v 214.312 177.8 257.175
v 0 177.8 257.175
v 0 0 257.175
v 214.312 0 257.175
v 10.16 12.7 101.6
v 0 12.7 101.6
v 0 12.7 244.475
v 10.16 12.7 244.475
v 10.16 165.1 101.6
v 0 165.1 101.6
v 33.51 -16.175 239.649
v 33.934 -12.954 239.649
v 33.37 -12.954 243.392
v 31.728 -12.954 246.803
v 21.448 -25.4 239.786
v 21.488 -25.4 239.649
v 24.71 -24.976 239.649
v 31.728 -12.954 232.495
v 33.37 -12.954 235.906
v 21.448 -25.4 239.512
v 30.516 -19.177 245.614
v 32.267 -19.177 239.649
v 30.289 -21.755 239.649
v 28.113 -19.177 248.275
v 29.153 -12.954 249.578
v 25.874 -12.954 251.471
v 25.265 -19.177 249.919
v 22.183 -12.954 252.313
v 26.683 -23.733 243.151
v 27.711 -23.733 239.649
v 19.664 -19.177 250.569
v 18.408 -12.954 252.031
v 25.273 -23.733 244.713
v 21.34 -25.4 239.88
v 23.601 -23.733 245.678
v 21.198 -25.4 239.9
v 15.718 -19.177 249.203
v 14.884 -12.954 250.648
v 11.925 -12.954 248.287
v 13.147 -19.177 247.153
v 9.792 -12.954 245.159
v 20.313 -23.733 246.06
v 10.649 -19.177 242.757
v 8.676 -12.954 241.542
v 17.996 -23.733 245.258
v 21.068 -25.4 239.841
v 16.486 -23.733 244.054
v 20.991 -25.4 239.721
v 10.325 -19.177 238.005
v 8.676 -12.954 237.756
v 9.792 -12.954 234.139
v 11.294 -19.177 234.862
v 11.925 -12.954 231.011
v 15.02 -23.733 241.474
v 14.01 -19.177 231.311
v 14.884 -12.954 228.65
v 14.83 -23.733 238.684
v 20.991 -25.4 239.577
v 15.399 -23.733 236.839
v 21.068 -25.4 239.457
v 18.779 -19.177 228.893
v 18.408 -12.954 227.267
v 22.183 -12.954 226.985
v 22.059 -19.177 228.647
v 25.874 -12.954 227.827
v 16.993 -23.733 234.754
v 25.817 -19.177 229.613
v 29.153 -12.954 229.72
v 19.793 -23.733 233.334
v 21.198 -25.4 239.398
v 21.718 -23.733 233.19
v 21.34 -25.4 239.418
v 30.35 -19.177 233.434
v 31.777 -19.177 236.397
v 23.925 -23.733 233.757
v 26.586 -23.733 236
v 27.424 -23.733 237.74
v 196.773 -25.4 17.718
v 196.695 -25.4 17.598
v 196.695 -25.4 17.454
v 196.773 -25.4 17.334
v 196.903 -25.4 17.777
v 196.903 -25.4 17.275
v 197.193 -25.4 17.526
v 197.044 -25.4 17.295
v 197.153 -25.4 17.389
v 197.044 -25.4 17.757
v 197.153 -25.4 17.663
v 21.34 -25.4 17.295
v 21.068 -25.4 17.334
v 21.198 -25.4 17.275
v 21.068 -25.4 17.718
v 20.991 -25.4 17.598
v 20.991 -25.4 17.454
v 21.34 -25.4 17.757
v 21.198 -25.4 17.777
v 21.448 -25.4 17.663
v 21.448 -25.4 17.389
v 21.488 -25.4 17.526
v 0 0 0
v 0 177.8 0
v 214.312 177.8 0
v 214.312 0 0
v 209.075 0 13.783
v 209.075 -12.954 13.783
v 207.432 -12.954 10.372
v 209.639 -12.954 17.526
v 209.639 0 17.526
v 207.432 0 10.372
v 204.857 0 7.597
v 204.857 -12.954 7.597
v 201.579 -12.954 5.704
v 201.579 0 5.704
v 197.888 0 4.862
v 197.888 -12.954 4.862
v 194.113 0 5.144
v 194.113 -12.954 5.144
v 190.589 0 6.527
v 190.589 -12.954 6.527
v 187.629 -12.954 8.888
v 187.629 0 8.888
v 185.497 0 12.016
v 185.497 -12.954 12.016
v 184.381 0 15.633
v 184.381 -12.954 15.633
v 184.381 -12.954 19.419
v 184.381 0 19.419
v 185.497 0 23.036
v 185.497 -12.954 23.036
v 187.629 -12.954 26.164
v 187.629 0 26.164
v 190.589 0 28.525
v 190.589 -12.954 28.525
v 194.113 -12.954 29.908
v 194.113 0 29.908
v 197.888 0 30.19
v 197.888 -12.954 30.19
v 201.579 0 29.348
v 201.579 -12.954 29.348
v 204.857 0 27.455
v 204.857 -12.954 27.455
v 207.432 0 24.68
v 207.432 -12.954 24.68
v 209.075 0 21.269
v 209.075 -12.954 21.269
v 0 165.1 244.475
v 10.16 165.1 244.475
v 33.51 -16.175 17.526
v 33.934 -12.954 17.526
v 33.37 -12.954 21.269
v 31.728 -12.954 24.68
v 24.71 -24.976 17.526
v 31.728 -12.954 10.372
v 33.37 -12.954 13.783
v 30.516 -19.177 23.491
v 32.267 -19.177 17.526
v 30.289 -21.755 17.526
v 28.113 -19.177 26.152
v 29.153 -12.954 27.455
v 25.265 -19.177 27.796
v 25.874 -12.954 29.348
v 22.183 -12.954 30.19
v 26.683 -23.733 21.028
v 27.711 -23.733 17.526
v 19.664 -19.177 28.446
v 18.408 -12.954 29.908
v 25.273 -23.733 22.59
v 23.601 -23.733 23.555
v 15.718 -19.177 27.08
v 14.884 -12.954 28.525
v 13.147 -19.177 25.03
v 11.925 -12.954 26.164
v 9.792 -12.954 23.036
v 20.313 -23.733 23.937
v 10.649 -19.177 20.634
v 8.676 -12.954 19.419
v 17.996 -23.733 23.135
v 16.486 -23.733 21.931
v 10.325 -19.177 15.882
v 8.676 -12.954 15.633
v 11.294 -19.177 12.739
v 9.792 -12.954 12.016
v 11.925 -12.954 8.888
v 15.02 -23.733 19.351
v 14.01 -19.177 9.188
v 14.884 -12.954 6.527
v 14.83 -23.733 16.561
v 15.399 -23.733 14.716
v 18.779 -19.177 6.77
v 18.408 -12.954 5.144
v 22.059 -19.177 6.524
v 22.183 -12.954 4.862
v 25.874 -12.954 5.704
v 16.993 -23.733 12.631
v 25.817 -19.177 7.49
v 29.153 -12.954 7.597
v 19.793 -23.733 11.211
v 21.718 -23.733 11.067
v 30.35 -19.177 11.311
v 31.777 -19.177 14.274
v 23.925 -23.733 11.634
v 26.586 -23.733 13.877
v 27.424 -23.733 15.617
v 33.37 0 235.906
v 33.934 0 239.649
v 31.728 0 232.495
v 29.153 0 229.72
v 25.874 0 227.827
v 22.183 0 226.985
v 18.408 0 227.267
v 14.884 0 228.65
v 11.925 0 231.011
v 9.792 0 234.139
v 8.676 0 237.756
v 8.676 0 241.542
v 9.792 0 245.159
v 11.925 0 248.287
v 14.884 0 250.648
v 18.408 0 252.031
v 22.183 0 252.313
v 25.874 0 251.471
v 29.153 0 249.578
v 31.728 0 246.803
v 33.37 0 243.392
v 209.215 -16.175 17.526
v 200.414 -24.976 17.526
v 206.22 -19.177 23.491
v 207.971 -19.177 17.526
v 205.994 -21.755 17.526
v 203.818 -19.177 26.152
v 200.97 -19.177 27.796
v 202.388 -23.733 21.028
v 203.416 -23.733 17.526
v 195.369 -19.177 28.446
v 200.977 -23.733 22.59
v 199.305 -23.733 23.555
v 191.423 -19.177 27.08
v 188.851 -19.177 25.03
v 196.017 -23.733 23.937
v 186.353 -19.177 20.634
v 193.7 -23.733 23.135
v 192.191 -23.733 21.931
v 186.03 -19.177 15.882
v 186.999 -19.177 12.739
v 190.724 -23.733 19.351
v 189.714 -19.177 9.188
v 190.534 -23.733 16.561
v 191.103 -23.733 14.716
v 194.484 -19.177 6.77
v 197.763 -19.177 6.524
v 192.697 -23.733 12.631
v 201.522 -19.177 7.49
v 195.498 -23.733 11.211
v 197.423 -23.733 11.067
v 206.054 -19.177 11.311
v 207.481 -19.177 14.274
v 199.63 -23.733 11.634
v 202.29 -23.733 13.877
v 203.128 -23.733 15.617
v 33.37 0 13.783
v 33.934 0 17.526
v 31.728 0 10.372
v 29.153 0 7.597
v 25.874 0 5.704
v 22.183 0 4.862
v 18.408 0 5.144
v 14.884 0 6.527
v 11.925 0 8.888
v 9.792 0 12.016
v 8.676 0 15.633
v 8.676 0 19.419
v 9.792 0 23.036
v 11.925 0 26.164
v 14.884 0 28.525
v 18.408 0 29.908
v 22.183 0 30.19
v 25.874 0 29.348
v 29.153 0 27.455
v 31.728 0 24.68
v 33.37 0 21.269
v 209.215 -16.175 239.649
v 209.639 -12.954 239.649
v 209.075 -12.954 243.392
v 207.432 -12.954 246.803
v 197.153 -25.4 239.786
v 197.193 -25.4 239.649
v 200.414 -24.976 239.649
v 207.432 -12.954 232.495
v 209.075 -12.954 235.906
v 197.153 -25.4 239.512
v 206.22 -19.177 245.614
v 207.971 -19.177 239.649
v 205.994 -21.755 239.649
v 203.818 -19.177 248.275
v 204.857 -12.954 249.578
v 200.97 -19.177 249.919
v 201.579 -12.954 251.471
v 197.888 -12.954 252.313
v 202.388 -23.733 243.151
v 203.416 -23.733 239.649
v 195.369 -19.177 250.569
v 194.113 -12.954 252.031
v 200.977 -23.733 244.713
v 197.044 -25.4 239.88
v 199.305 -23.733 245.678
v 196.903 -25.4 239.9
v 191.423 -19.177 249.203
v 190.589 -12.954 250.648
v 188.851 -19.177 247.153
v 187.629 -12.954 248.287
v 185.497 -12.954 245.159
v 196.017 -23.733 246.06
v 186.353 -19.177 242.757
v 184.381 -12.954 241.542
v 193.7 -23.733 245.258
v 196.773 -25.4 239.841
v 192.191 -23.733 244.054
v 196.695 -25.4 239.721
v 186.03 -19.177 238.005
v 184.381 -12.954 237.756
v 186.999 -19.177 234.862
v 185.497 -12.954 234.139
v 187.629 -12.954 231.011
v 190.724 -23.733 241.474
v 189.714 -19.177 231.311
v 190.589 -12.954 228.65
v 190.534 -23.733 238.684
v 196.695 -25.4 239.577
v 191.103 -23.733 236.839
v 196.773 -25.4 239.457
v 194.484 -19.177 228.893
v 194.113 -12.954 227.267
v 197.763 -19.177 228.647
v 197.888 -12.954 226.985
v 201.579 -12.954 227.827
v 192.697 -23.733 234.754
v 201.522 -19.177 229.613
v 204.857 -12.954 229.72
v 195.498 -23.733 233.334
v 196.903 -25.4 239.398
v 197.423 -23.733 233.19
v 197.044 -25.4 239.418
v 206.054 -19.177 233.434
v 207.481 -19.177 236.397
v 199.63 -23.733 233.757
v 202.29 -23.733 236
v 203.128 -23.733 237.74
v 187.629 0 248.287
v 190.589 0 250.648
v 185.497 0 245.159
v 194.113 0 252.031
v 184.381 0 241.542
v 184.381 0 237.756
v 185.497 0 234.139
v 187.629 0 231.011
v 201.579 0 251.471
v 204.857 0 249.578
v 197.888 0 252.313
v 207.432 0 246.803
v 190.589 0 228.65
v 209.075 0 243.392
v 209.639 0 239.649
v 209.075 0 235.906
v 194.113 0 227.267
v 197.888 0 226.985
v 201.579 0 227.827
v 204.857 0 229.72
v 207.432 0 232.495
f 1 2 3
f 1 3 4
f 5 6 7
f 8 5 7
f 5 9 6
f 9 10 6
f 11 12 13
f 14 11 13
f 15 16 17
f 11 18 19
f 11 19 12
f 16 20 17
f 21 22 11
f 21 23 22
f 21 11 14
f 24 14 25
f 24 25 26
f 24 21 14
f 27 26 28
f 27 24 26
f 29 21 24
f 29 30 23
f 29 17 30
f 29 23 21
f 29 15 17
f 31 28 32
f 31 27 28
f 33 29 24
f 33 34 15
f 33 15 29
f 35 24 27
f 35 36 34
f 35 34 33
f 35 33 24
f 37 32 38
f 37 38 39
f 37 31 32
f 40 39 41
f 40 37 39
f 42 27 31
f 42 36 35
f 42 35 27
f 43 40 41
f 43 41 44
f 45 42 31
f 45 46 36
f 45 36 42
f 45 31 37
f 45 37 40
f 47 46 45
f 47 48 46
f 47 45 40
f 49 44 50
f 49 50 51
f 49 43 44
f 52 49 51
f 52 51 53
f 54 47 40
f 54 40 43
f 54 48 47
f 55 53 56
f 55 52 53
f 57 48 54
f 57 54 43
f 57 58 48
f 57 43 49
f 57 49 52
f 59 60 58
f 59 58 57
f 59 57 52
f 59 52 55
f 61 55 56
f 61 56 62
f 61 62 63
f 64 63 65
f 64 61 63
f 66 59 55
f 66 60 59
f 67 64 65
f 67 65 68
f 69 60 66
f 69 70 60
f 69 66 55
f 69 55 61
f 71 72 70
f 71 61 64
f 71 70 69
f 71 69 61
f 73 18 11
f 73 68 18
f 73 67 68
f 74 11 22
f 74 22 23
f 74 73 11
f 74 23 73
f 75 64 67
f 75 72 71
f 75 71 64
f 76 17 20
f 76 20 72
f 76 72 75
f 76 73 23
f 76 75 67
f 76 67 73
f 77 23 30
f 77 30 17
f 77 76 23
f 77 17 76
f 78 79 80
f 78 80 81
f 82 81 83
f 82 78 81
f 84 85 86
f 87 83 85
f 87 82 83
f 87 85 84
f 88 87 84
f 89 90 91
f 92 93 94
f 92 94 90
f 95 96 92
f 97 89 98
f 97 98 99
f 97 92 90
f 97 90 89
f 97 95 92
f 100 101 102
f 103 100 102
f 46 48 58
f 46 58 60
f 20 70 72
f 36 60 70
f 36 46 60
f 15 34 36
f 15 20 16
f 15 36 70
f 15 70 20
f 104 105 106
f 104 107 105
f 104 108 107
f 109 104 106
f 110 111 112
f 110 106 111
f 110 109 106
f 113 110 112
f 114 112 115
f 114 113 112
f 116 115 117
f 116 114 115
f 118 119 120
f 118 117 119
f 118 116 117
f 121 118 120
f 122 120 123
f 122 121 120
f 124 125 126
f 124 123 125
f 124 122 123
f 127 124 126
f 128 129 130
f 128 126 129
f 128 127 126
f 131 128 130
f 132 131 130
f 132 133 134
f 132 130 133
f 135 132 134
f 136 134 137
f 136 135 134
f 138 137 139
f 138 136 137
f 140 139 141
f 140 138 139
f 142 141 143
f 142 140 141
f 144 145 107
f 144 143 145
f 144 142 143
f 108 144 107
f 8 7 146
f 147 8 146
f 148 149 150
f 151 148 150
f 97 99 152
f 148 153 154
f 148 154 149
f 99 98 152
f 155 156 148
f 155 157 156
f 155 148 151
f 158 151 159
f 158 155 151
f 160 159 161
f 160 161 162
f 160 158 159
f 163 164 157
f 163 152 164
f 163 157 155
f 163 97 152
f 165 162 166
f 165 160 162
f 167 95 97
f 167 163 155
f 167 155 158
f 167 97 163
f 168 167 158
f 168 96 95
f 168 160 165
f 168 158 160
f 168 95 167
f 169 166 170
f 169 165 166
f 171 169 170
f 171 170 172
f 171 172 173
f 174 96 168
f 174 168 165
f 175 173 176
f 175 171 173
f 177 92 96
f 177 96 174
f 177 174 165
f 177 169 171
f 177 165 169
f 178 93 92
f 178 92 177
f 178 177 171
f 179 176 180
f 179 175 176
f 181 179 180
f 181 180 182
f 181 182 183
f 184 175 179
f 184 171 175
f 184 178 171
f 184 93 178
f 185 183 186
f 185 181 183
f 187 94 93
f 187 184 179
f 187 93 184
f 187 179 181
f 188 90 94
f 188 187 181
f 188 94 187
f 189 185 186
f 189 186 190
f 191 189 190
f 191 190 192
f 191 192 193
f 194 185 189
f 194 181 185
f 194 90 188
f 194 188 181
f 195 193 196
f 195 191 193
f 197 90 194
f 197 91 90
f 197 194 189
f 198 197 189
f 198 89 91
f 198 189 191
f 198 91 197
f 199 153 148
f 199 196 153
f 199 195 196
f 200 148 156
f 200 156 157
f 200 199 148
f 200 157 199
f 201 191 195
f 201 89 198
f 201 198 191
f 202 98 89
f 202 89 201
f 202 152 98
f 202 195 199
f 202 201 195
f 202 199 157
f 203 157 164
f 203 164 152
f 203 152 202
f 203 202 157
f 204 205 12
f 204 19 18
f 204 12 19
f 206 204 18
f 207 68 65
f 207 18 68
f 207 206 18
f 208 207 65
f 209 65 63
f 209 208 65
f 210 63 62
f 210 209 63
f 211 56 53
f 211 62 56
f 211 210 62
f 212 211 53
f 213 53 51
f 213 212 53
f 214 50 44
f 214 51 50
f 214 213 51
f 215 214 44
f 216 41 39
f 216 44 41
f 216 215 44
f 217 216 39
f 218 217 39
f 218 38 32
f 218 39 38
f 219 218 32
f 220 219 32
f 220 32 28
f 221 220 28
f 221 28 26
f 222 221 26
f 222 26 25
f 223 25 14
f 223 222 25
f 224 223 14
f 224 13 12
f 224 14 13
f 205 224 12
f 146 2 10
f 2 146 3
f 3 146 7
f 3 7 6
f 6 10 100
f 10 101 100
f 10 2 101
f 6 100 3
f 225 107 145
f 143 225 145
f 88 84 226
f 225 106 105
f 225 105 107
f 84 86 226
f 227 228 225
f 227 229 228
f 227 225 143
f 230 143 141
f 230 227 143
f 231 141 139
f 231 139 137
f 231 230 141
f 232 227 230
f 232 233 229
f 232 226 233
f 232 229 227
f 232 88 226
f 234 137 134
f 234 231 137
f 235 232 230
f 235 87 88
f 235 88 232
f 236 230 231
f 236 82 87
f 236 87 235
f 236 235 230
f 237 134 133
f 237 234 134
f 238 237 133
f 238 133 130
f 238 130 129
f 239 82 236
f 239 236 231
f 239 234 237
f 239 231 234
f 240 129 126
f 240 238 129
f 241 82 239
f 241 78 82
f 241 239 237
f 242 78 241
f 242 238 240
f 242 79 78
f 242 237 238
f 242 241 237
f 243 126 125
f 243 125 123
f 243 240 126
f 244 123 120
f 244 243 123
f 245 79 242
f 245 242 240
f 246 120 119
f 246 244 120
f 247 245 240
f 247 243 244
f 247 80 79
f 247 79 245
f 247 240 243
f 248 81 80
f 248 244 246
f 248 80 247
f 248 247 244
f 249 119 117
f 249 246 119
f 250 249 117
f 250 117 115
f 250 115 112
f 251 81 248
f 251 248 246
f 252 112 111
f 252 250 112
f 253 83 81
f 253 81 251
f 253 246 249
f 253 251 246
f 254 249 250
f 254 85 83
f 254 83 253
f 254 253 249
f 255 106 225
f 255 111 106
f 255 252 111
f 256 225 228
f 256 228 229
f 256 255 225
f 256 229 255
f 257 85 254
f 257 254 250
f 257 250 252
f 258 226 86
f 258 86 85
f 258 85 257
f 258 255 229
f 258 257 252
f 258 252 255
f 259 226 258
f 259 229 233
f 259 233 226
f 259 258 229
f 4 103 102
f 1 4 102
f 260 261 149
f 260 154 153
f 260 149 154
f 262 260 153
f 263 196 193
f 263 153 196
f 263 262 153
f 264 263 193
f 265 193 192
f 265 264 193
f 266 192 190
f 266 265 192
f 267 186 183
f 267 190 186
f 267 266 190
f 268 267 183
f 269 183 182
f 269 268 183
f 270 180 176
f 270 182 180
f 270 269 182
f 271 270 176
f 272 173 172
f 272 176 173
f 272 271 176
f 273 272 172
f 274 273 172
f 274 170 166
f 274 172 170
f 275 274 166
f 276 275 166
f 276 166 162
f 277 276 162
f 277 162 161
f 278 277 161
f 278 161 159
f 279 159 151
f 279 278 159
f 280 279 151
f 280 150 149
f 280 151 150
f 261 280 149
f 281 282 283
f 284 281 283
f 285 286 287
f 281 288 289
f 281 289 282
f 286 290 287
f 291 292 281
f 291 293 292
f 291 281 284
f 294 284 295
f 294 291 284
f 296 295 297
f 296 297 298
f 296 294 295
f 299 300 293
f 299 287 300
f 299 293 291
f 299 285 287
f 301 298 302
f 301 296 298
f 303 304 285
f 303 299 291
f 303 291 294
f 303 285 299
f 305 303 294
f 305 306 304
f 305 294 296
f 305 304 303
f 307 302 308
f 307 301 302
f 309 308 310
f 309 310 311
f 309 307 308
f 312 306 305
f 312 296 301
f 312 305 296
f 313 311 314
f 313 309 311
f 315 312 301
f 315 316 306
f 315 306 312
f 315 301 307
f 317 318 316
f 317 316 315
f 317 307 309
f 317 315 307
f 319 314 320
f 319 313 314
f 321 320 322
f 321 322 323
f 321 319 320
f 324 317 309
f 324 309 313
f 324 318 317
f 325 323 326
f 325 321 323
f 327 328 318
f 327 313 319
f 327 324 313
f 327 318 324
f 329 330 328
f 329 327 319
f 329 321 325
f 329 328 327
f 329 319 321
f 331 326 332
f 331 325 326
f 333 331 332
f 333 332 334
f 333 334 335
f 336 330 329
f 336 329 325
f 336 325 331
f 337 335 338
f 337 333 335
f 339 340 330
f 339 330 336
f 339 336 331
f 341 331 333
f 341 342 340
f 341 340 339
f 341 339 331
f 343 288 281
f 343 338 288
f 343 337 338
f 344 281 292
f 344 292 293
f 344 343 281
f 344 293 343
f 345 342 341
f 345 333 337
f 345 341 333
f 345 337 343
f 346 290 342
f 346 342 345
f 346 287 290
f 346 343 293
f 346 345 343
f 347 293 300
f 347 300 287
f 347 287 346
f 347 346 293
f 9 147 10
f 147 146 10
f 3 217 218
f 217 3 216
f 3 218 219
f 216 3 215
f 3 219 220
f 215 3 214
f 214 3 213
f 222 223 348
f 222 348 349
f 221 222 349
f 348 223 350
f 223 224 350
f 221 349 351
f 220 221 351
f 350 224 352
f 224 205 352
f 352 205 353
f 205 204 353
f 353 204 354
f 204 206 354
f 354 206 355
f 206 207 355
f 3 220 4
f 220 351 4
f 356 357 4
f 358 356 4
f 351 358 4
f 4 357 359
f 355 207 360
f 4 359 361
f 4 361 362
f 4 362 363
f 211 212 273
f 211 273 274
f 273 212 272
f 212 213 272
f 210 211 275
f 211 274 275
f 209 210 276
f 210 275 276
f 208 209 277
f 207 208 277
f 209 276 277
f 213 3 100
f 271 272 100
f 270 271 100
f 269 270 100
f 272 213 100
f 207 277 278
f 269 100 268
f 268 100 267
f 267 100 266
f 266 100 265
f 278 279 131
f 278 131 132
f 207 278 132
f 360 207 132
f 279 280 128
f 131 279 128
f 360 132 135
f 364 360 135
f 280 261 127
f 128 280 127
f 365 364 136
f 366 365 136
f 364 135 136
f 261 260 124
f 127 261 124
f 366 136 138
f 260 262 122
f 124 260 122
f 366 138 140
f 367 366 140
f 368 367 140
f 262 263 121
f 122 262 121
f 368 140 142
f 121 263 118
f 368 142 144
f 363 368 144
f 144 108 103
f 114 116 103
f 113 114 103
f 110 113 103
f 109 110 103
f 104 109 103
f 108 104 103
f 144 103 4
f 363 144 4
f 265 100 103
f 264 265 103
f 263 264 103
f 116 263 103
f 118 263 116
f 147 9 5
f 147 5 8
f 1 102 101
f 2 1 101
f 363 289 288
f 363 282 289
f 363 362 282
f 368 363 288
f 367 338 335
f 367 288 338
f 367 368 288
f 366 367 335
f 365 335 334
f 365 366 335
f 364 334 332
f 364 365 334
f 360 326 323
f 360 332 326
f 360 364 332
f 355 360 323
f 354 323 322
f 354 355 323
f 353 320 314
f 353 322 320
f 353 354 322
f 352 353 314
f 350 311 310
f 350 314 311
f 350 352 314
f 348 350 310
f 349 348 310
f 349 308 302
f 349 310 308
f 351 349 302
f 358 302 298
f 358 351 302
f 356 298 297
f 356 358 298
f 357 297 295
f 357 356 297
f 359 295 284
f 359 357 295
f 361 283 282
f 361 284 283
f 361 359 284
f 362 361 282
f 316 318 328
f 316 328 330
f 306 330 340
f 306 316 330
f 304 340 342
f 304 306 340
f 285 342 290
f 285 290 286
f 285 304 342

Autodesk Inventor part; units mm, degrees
ref_plane "YZ Plane" through (0, 0, 0) normal (1, 0, 0) x (0, 1, 0)
ref_plane "XZ Plane" through (0, 0, 0) normal (0, 1, 0) x (-1, 0, 0)
ref_plane "XY Plane" through (0, 0, 0) normal (0, 0, 1) x (1, 0, 0)
sketch "Sketch1" plane through (0, 0, 0) normal (0, 0, 1) x (1, 0, 0)
  line L0 (0, 0) -> (214.3125, 0)
  line L1 (214.3125, 0) -> (214.3125, 177.8)
  line L2 (214.3125, 177.8) -> (0, 177.8)
  line L3 (0, 177.8) -> (0, 0)
  dimension "d0" = 214.3125
  dimension "d1" = 177.8
extrude "Extrusion1" add sketch "Sketch1" along normal blind 257.175
sketch "Sketch2" plane through (0, 0, 0) normal (0, -1, 0) x (1, 0, 0)
  line L0 (214.3125, 0) -> (214.3125, 257.175) projected
  line L1 (214.3125, 128.5875) -> (107.1562, 128.5875) construction
  line L2 (107.1562, 128.5875) -> (107.1562, 0) construction
  line L3 (214.3125, 257.175) -> (0, 257.175) construction
  line L4 (214.3125, 0) -> (214.3125, 257.175) construction
  line L5 (214.3125, 257.175) -> (214.3125, 239.649) construction
  line L6 (214.3125, 239.649) -> (196.9389, 239.649) construction
  circle A0 centre (196.9389, 239.649) radius 12.7
  circle A1 centre (196.9389, 17.526) radius 12.7
  line L7 (196.9389, 239.649) -> (11.3133, 239.649) construction
  circle A2 centre (21.2344, 239.649) radius 12.7
  line L8 (0, 0) -> (0, 257.175) construction
  circle A3 centre (21.2344, 17.526) radius 12.7
  dimension "d4" = 107.1562
  dimension "d6" = 17.526
  dimension "d7" = 17.3736
  dimension "d8" = 25.4
  dimension "d9" = 25.4
  dimension "d10" = 21.2344
extrude "Extrusion2" add sketch "Sketch2" along normal blind 25.4
fillet "Fillet1" radius 12.446 4 edges at (184.2389, -25.4, 239.649) (8.5344, -25.4, 239.649) (8.5344, -25.4, 17.526) (184.2389, -25.4, 17.526)
sketch "Sketch3" plane through (0, 0, 0) normal (-1, 0, 0) x (0, 0, 1)
  line L0 (257.175, 0) -> (257.175, 177.8) projected
  line L1 (257.175, 177.8) -> (257.175, 165.1)
  line L2 (257.175, 165.1) -> (244.475, 165.1)
  line L3 (0, 0) -> (101.6, 0)
  line L4 (101.6, 0) -> (101.6, 12.7)
  line L5 (244.475, 165.1) -> (101.6, 165.1)
  line L6 (101.6, 165.1) -> (101.6, 12.7)
  line L7 (101.6, 12.7) -> (244.475, 12.7)
  line L8 (244.475, 12.7) -> (244.475, 165.1)
  dimension "d14" = 12.7
  dimension "d15" = 12.7
  dimension "d16" = 101.6
  dimension "d17" = 12.7
extrude "Extrusion3" cut sketch "Sketch3" against normal blind 10.16
properties part number "PXie-1083"
